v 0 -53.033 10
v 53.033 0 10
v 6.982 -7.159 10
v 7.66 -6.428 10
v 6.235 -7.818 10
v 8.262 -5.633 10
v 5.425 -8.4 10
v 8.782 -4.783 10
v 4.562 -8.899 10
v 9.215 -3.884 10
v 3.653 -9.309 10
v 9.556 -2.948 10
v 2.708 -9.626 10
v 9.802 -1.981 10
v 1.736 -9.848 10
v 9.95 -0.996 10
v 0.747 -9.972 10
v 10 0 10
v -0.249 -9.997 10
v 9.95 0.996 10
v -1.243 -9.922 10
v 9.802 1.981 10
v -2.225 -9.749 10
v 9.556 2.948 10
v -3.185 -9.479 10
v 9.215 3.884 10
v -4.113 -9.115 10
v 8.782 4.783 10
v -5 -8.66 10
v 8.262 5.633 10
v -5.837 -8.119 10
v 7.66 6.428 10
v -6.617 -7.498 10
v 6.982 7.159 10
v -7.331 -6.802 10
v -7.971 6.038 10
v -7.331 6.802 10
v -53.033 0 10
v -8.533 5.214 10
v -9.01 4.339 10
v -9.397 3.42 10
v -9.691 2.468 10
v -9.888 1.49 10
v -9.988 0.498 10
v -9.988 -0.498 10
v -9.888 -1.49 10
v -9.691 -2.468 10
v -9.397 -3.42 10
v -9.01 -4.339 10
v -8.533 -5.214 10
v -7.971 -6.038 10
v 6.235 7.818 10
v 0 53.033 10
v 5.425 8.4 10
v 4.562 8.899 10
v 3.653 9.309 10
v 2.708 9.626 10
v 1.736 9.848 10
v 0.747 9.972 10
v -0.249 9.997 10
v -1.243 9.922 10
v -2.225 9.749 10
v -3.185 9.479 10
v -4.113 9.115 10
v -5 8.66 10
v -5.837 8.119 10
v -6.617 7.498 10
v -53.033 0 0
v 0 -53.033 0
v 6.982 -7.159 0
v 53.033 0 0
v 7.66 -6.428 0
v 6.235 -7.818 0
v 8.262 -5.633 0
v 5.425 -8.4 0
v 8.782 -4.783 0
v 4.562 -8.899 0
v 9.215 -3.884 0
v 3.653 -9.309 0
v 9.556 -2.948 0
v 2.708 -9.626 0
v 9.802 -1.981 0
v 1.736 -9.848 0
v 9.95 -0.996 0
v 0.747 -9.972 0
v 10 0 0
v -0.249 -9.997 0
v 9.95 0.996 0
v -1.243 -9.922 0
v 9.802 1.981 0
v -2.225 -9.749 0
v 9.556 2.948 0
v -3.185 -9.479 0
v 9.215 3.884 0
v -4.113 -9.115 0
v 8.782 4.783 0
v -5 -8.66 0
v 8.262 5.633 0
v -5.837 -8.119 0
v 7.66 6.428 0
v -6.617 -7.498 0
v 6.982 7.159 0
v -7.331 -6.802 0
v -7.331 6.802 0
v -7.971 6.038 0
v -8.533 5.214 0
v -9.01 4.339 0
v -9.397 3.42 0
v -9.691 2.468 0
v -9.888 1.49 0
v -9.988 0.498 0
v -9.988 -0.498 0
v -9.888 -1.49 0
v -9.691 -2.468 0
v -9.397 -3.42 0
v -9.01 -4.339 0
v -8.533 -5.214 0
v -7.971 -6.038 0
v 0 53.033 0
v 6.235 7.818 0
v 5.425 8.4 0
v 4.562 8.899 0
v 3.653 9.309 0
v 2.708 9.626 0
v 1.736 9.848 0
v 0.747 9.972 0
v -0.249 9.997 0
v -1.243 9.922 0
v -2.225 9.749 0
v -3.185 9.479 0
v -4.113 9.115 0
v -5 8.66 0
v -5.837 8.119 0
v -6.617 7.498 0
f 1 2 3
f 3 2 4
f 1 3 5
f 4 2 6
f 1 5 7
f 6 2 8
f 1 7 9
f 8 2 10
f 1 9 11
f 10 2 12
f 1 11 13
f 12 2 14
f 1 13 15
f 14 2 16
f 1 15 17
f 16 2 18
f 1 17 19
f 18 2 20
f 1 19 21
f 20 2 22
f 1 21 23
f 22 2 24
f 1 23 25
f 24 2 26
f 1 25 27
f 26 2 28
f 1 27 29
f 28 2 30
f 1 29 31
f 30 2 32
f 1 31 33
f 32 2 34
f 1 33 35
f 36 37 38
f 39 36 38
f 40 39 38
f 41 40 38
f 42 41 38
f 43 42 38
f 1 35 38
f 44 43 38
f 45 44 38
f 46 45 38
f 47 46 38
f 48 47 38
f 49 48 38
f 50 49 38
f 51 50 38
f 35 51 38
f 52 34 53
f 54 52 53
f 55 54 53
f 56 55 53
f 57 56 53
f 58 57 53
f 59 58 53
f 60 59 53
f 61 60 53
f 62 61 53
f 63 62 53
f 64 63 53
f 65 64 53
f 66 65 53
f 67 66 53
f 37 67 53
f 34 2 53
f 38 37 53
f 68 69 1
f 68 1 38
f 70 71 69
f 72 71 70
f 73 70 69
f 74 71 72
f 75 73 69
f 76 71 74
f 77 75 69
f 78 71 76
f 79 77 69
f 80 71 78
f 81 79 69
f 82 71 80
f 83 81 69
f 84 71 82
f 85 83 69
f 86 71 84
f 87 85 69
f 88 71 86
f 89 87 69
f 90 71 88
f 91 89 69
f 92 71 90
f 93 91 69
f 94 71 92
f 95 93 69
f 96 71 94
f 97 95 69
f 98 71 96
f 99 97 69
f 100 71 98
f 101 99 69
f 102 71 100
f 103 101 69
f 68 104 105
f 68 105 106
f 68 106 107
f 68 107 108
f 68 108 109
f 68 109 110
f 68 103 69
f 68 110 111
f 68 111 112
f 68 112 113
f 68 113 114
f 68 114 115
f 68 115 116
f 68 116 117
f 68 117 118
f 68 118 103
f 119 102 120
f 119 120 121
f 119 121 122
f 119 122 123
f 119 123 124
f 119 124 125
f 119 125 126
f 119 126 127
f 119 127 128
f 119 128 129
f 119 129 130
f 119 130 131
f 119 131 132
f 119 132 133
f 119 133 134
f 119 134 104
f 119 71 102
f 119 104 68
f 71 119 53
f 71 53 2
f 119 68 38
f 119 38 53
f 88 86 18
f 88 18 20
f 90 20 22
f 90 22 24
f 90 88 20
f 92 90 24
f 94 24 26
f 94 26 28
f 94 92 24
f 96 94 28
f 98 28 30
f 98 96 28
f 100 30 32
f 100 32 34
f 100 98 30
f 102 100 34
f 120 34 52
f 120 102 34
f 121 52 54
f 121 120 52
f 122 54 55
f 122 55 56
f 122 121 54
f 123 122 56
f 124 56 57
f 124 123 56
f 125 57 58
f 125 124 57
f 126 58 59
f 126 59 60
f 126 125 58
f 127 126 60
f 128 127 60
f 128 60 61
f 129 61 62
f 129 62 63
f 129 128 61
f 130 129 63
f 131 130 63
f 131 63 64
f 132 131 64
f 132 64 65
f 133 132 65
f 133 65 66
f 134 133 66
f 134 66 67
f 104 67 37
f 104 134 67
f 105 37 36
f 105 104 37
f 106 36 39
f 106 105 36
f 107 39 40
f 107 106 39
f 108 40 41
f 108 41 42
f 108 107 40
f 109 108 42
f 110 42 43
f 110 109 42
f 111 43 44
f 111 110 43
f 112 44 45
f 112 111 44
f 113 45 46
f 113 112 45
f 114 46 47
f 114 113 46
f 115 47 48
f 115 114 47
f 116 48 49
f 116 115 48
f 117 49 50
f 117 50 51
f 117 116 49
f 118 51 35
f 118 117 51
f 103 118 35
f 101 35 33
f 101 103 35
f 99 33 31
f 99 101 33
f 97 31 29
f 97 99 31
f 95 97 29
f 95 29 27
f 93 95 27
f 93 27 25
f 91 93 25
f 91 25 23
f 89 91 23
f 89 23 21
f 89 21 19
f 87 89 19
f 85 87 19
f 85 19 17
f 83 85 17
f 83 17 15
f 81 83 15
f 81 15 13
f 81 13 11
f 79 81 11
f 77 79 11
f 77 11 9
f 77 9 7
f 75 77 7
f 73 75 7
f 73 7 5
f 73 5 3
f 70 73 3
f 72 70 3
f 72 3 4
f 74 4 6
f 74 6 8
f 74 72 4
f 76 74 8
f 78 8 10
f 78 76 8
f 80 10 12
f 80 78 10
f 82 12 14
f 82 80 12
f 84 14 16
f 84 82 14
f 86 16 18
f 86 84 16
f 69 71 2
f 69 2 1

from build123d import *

# Parameters (mm, degrees)
CROQUIS1_R              = 10
SALIENTE_EXTRUIR1_DEPTH = 10


with BuildPart() as part:
    # Croquis1 → Saliente-Extruir1 (new body)
    with BuildSketch(Plane.XY):
        Polygon((-53.033008589, 0), (0, 53.033008589), (53.033008589, 0), (0, -53.033008589), align=None)
        Circle(CROQUIS1_R, mode=Mode.SUBTRACT)
    extrude(amount=SALIENTE_EXTRUIR1_DEPTH)


solid = part.part
